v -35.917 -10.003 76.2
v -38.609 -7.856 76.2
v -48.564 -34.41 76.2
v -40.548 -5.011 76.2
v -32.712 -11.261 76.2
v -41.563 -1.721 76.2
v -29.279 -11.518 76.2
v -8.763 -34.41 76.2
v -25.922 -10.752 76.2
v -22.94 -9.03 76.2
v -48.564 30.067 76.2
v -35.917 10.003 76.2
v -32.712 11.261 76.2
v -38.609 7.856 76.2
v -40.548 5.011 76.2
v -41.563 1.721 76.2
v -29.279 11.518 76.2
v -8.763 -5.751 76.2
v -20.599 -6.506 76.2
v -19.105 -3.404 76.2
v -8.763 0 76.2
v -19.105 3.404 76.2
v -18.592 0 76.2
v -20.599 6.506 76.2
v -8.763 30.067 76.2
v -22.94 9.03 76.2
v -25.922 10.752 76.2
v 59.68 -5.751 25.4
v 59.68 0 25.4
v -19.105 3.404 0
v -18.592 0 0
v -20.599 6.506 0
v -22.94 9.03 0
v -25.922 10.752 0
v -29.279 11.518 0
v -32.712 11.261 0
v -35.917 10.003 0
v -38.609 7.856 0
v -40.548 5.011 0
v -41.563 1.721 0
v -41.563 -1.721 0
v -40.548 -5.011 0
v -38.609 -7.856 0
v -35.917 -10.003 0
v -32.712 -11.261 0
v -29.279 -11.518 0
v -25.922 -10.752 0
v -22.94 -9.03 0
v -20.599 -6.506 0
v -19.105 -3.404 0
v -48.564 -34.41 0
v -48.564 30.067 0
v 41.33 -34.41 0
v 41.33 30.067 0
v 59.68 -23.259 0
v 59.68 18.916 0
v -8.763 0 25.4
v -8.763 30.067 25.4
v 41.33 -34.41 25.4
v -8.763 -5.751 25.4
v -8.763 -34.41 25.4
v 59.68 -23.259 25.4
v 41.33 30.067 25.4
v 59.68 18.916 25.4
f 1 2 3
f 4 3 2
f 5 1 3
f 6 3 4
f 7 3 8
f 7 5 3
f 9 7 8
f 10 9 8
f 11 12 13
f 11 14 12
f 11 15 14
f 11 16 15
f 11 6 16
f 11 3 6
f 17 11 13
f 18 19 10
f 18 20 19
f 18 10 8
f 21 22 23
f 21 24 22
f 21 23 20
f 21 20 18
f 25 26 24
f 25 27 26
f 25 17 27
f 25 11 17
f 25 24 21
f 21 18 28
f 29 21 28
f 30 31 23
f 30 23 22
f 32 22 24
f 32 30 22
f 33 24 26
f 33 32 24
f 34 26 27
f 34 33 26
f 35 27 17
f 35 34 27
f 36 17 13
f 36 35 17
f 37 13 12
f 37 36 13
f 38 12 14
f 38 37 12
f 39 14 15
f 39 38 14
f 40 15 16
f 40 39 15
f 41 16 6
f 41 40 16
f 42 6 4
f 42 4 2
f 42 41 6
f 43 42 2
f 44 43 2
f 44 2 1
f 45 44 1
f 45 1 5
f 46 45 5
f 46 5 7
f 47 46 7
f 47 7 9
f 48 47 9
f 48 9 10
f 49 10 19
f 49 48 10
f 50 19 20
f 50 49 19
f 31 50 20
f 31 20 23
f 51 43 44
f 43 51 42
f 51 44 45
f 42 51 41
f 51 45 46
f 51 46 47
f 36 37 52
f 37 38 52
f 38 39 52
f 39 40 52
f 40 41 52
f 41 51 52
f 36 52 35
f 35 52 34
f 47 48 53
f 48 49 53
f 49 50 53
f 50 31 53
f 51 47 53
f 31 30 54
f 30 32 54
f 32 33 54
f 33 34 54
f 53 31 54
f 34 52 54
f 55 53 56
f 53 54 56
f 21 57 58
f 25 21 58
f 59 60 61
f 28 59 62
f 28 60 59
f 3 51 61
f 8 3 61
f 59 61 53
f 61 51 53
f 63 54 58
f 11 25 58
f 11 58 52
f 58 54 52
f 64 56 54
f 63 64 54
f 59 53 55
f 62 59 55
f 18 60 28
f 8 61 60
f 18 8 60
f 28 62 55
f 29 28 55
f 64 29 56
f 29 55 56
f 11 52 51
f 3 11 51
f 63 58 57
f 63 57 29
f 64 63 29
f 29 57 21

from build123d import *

# Parameters (mm, degrees)
F0_R     = 11.5502364961
F1_DEPTH = 76.2
F2_DEPTH = 25.4
F3_DEPTH = 25.4
F0_W     = 68.4429863468
F0_H     = 5.7512475178
F4_DEPTH = 76.2
F6_DEPTH = 25.4


with BuildPart() as f1:
    # F0 (on Top) → F1 (new body)
    with BuildSketch(Plane.XY):
        Polygon((-8.7633775547, 30.0670936704), (-48.5640950501, 30.0670936704), (-48.5640950501, -34.4098359346), (-8.7633775547, -34.4098359346), (-8.7633775547, -5.7512475178), (-8.7633775547, 0), align=None)
        with Locations((-30.1417633891, 0)):
            Circle(F0_R, mode=Mode.SUBTRACT)
    extrude(amount=F1_DEPTH)

    # F0 (on Top) → F2 (join)
    with BuildSketch(Plane.XY):
        Polygon((-8.7633775547, -5.7512475178), (-8.7633775547, -34.4098359346), (41.3302518427, -34.4098359346), (59.6796087921, -23.2587810606), (59.6796087921, -5.7512475178), align=None)
    extrude(amount=F2_DEPTH)

    # F0 (on Top) → F3 (join)
    with BuildSketch(Plane.XY):
        Polygon((41.3302518427, 30.0670936704), (-8.7633775547, 30.0670936704), (-8.7633775547, 0), (59.6796087921, 0), (59.6796087921, 18.9160387963), align=None)
    extrude(amount=F3_DEPTH)

    # F0 (on Top) → F4 (join)
    with BuildSketch(Plane.XY):
        with Locations((25.4581156187, -2.8756237589)):
            Rectangle(F0_W, F0_H)
    extrude(amount=F4_DEPTH)

    # F5 (on face) → F6 (cut)
    with BuildSketch(Plane.XZ.offset(5.7512475178)):
        Polygon((59.6796087921, 76.2), (-8.7633775547, 76.2), (59.6796087921, 25.4), align=None)
    extrude(amount=-F6_DEPTH, mode=Mode.SUBTRACT)


solid = f1.part
